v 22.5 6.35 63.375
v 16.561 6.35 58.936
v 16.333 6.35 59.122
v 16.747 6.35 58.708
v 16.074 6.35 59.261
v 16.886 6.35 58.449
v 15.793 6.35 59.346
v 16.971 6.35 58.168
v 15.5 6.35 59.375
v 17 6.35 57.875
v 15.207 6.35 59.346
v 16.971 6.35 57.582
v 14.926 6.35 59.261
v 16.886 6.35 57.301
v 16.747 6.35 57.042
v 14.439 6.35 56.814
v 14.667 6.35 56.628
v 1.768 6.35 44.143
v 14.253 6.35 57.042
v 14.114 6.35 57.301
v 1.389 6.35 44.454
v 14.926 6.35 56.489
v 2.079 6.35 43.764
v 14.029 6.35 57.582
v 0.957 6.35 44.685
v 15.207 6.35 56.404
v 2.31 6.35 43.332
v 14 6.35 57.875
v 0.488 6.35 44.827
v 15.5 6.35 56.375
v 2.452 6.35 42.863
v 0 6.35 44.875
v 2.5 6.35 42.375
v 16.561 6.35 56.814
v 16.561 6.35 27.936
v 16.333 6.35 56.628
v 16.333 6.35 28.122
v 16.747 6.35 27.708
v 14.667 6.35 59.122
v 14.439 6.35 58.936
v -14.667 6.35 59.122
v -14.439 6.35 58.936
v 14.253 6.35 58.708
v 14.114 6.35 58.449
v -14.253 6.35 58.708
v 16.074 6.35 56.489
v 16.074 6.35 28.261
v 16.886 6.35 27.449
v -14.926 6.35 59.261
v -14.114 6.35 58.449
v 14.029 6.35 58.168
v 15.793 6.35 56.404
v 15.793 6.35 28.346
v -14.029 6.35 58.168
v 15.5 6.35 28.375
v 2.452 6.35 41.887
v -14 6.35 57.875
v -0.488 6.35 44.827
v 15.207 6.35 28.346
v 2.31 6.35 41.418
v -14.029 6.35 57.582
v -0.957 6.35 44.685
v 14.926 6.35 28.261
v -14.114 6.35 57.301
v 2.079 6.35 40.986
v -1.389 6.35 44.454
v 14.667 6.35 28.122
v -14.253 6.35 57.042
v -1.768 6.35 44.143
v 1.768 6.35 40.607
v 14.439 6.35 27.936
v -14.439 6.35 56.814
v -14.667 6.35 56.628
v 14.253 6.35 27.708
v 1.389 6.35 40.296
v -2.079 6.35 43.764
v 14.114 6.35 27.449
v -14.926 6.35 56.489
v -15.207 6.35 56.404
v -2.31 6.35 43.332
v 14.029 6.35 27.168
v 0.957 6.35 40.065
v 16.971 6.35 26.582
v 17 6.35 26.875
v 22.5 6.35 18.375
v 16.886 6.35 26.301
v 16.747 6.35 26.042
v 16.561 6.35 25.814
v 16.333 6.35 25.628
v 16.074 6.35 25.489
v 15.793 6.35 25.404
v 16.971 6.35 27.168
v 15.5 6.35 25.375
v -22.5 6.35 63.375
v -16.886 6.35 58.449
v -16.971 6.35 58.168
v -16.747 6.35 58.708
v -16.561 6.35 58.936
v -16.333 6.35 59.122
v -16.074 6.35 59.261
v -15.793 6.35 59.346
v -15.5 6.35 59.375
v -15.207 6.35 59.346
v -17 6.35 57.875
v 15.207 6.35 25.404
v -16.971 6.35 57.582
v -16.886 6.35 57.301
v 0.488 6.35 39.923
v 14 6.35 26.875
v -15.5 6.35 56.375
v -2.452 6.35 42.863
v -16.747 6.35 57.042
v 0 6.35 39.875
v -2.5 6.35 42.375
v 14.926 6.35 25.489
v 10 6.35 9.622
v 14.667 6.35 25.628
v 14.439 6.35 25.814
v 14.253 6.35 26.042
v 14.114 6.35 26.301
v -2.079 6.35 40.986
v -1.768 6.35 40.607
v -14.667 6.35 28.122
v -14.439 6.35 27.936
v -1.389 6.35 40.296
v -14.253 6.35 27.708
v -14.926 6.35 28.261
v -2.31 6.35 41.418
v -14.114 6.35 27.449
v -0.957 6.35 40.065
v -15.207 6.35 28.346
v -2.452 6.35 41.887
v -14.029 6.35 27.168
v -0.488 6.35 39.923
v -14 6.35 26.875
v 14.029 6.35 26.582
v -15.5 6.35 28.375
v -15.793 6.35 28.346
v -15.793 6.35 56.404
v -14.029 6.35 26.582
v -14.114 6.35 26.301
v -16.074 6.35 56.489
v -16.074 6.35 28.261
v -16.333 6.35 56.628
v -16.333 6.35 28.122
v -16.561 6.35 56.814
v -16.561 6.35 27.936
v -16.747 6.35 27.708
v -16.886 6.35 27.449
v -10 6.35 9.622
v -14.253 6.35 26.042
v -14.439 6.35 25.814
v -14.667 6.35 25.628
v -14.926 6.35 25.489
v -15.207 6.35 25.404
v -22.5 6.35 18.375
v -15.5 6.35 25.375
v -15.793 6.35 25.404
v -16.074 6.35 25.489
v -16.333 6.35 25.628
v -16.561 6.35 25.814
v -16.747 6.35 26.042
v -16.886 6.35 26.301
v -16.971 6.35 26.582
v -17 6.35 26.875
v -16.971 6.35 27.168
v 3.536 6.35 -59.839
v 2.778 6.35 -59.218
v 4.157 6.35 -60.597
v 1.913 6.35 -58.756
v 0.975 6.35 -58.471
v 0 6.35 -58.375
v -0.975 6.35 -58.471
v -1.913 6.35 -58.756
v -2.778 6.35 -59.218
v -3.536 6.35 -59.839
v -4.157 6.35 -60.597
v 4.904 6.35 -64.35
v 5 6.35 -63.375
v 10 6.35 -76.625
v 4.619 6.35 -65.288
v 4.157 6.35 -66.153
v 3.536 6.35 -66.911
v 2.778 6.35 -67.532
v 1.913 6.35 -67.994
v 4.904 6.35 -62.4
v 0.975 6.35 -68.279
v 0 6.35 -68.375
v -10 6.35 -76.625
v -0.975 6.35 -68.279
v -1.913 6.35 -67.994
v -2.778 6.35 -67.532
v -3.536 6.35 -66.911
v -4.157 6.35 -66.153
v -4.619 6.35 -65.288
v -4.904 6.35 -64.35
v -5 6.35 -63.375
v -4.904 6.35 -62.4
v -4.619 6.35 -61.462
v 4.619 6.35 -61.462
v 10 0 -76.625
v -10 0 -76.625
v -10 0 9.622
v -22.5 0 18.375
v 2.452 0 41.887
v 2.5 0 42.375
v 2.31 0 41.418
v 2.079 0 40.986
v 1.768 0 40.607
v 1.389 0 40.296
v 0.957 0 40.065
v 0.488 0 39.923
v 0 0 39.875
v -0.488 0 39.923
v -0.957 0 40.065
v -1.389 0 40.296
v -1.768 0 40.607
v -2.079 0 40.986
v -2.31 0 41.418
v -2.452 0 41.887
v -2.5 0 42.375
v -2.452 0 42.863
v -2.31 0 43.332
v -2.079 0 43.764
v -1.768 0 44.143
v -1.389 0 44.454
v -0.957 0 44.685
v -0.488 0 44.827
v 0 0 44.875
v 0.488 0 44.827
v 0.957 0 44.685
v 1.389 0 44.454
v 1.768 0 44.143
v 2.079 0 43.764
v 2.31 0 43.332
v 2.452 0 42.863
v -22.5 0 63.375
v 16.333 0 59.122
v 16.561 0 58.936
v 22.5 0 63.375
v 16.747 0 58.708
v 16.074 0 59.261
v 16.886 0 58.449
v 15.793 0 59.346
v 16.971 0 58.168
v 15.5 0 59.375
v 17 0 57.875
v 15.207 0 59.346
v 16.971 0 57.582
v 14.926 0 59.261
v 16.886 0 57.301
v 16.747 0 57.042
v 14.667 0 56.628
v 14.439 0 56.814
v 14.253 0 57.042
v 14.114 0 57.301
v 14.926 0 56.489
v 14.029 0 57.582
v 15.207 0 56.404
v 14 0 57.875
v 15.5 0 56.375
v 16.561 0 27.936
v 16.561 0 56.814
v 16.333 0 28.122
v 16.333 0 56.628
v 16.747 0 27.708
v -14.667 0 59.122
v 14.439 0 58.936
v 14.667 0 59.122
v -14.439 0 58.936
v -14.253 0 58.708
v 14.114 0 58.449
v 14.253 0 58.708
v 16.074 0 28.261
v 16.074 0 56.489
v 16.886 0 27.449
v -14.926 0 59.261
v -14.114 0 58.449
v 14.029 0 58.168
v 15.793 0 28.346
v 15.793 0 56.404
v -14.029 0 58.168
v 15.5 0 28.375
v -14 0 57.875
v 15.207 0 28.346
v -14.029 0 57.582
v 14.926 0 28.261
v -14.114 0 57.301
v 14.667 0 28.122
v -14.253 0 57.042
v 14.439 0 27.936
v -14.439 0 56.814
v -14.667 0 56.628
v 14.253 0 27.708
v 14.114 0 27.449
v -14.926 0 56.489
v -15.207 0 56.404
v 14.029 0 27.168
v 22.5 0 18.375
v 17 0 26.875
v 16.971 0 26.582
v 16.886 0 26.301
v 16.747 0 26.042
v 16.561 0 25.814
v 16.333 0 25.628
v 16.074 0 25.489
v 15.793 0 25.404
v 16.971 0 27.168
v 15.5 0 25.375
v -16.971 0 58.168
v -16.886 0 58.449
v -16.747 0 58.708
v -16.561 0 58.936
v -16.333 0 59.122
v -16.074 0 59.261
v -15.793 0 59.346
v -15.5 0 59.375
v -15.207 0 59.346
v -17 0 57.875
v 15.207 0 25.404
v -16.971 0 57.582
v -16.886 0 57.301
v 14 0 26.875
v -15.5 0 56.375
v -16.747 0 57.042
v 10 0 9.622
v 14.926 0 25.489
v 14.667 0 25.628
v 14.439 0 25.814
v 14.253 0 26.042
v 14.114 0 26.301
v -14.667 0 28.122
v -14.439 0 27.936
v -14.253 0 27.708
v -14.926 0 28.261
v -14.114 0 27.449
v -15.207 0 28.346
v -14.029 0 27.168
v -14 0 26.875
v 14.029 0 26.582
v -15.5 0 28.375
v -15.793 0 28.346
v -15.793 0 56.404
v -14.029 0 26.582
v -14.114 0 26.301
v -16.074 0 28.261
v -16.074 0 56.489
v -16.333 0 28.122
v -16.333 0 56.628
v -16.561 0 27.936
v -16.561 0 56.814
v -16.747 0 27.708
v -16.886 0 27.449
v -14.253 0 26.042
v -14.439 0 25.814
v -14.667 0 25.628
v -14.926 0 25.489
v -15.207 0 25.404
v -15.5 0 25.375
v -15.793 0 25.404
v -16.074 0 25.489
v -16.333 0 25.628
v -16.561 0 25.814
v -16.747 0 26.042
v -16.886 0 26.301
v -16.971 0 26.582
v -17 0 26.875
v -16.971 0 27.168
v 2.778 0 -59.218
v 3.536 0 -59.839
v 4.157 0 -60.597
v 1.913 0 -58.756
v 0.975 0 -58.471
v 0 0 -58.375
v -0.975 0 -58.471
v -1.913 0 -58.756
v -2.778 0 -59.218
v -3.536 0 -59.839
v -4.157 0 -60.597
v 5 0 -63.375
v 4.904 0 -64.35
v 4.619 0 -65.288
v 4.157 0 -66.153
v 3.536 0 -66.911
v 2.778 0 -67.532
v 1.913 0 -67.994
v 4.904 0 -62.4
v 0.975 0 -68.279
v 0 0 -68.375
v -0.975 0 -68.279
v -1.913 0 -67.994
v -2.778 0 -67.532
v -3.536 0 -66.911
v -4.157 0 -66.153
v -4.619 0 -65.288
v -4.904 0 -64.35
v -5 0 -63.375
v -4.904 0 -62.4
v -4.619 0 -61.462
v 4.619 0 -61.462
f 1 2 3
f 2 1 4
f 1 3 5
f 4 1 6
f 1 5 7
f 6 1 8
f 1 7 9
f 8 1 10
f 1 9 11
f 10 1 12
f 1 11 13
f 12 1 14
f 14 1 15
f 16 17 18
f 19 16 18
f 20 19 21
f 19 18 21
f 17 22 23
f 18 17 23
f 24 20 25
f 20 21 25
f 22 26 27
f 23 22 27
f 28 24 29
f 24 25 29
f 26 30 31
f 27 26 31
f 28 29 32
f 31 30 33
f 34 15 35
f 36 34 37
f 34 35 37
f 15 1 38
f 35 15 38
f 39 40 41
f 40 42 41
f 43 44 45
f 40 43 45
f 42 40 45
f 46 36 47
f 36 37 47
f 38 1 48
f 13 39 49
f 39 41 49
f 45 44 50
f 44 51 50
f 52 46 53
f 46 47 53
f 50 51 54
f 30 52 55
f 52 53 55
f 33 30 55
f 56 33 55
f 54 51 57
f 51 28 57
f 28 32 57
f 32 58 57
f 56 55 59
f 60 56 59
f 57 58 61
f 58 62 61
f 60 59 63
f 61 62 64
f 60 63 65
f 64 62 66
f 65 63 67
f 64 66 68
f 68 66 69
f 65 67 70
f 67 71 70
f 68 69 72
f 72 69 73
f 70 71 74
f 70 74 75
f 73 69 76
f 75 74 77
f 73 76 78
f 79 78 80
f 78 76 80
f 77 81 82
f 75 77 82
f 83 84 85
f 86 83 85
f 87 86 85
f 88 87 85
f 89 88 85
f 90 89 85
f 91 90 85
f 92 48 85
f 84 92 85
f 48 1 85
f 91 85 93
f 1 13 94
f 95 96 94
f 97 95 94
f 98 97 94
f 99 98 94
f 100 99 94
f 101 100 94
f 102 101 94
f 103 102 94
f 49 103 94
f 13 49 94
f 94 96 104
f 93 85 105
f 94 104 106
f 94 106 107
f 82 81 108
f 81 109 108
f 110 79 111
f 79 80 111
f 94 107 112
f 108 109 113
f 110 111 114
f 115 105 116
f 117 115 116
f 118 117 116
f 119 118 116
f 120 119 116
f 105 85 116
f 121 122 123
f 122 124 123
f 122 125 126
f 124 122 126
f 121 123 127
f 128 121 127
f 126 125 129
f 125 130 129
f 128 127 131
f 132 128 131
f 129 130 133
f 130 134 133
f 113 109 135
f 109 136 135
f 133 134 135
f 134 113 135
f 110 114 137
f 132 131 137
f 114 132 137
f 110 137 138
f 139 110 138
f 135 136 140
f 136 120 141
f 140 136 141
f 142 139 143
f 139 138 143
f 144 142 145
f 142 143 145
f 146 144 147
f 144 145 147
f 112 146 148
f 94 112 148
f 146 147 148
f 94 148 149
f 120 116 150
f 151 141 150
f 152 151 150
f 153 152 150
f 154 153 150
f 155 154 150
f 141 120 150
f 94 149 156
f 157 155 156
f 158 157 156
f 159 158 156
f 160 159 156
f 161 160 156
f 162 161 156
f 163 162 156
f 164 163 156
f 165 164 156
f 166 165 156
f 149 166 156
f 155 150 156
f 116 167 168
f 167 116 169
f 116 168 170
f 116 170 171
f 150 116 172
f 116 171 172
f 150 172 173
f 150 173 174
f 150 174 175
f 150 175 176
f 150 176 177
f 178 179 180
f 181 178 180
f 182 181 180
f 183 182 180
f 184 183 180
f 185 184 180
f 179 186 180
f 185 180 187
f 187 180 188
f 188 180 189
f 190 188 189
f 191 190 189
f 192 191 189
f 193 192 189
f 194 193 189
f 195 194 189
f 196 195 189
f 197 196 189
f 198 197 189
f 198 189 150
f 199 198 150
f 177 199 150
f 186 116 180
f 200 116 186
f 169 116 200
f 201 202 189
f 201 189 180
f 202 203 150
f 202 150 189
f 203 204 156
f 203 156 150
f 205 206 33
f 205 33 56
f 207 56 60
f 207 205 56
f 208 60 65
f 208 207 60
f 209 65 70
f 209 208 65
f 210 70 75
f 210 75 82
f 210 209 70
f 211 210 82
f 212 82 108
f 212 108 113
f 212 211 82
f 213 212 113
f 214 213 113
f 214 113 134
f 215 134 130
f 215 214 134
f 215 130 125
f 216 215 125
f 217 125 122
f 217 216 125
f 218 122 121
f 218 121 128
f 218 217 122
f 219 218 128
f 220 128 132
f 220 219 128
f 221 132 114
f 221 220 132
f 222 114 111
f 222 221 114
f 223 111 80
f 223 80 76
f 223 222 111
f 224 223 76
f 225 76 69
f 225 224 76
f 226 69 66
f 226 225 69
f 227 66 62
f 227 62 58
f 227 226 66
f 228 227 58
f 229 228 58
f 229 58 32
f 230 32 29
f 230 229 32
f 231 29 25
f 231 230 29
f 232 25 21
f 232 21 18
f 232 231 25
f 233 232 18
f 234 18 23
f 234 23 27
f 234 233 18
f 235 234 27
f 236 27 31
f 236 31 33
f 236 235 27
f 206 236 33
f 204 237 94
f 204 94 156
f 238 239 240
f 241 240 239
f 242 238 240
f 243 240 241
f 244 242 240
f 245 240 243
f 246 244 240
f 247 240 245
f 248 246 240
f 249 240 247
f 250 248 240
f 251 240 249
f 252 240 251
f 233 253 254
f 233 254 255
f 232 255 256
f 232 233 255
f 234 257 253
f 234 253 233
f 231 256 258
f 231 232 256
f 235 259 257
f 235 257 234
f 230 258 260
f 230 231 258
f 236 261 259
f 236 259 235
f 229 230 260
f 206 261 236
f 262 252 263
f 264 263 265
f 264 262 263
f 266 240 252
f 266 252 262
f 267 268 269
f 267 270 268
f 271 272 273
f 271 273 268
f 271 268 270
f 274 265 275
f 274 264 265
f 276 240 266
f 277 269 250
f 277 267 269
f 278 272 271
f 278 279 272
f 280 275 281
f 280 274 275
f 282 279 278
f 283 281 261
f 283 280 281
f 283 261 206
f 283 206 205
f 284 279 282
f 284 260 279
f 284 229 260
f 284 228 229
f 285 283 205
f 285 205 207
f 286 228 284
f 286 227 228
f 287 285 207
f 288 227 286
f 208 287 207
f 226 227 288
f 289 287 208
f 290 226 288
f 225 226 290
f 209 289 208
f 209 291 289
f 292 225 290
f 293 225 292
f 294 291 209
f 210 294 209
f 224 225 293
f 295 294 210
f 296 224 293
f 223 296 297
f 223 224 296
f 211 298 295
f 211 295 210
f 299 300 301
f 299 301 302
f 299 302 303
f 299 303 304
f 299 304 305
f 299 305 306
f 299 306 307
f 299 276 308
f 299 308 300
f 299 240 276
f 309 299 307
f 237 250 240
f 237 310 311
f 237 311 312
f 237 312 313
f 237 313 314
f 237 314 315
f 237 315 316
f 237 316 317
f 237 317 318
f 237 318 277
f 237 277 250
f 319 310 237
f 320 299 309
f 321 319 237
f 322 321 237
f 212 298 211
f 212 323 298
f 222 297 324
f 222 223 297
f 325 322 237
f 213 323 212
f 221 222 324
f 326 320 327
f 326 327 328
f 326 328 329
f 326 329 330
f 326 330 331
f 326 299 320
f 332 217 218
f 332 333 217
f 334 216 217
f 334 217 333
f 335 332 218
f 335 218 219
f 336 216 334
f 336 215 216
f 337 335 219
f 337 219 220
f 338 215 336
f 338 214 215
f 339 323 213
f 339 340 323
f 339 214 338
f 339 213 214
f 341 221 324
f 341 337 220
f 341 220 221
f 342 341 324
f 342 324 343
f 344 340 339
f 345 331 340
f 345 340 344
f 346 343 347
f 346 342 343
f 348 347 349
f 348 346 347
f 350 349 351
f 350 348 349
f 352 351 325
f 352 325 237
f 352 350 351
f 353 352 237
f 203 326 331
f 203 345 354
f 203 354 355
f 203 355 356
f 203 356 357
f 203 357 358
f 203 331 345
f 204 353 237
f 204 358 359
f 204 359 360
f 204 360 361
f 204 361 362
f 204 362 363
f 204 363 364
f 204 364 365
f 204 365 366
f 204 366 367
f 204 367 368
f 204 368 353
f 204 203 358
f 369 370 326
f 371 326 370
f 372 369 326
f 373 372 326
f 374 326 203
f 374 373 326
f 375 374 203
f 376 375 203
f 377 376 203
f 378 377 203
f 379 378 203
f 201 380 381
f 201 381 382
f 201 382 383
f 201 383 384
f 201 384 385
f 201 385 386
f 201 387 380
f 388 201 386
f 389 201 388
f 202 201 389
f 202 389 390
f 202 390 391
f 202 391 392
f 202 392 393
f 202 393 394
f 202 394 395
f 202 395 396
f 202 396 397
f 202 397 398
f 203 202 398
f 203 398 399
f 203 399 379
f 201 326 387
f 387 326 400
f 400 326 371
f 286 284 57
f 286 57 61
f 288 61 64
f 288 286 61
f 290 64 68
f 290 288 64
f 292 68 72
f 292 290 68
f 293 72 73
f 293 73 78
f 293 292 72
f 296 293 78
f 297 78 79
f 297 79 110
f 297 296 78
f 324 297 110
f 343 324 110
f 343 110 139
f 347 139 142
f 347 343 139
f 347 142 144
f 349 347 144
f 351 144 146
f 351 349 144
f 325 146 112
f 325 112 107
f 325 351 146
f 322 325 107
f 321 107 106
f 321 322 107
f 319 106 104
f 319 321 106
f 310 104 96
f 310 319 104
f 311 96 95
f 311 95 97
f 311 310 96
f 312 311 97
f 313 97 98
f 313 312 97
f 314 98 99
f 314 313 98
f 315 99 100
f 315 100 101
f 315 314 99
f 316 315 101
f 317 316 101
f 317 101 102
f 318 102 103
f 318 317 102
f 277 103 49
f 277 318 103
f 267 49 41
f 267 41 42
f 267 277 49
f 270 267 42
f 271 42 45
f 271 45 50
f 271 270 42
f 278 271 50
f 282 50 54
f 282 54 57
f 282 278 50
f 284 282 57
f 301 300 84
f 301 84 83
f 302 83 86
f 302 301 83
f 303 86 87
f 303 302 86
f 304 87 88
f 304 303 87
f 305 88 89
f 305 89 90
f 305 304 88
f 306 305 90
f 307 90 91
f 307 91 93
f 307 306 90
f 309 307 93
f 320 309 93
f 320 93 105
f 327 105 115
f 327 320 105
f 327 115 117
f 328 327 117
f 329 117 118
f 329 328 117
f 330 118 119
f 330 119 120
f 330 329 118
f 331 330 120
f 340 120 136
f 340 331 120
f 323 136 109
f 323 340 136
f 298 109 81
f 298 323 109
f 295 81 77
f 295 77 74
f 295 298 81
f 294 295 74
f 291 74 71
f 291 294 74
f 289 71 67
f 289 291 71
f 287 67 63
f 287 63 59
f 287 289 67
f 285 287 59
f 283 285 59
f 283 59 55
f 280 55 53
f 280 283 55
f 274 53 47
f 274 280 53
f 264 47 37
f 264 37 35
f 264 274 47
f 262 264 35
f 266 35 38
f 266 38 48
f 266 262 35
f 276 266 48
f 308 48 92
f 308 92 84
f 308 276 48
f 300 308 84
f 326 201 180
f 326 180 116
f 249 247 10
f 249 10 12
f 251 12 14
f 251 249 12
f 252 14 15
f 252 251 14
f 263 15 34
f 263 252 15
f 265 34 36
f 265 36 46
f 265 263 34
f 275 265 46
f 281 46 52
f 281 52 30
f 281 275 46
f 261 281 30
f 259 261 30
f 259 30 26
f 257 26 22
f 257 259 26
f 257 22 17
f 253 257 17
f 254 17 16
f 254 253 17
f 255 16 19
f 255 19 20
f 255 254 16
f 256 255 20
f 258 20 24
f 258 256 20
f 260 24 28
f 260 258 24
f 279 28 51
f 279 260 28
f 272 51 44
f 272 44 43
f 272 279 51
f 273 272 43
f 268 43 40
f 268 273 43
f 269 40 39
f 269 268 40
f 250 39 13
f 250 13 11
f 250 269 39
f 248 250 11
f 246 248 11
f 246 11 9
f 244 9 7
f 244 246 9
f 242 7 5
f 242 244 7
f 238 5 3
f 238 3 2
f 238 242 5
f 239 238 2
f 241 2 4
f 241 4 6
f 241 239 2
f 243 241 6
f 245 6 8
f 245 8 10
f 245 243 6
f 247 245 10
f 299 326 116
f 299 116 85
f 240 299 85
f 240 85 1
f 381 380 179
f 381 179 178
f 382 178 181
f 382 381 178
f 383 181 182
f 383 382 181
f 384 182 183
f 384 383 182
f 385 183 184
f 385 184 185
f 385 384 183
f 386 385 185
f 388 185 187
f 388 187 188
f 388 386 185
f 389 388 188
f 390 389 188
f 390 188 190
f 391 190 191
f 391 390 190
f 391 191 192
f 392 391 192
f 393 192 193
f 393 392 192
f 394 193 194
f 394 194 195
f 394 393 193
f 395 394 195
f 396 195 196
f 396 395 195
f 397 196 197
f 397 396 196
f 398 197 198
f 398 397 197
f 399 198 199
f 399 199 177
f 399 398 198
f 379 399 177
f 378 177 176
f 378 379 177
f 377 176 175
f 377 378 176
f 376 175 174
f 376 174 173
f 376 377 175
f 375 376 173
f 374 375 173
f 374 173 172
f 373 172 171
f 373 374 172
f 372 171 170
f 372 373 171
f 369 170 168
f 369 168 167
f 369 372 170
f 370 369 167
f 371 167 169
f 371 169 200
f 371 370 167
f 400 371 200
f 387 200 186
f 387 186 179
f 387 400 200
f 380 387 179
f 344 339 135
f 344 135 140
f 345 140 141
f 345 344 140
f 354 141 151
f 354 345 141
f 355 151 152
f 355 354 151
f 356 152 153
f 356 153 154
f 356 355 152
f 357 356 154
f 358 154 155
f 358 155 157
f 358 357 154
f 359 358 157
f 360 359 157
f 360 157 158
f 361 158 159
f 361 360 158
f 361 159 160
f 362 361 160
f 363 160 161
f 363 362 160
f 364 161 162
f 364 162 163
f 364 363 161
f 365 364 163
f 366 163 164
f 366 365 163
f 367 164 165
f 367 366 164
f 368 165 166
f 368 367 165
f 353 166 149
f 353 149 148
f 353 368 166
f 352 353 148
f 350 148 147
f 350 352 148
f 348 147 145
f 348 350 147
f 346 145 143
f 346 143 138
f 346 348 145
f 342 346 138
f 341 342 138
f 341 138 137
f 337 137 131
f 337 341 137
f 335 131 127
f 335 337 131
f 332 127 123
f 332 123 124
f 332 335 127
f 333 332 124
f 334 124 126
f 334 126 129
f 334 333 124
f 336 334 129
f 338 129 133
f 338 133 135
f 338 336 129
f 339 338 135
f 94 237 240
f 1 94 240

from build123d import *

# Parameters (mm, degrees)
SKETCH1_R           = 5
SKETCH1_R_2         = 1.5
SKETCH1_R_3         = 2.5
BOSS_EXTRUDE1_DEPTH = 6.35


with BuildPart() as part:
    # Sketch1 → Boss-Extrude1 (new body)
    with BuildSketch(Plane(origin=(0, 0, 0), x_dir=(1, 0, 0), z_dir=(0, 1, 0))):
        Polygon((-10, -9.622405772), (-10, 76.625), (10, 76.625), (10, -9.622405772), (22.5, -18.375), (22.5, -63.375), (0, -63.375), (-22.5, -63.375), (-22.5, -18.375), align=None)
        with Locations((0, 63.375)):
            Circle(SKETCH1_R, mode=Mode.SUBTRACT)
        with Locations((-15.5, -26.875)):
            Circle(SKETCH1_R_2, mode=Mode.SUBTRACT)
        with Locations((15.5, -26.875)):
            Circle(SKETCH1_R_2, mode=Mode.SUBTRACT)
        with Locations((15.5, -57.875)):
            Circle(SKETCH1_R_2, mode=Mode.SUBTRACT)
        with Locations((-15.5, -57.875)):
            Circle(SKETCH1_R_2, mode=Mode.SUBTRACT)
        with Locations((0, -42.375)):
            Circle(SKETCH1_R_3, mode=Mode.SUBTRACT)
    extrude(amount=BOSS_EXTRUDE1_DEPTH)


solid = part.part
